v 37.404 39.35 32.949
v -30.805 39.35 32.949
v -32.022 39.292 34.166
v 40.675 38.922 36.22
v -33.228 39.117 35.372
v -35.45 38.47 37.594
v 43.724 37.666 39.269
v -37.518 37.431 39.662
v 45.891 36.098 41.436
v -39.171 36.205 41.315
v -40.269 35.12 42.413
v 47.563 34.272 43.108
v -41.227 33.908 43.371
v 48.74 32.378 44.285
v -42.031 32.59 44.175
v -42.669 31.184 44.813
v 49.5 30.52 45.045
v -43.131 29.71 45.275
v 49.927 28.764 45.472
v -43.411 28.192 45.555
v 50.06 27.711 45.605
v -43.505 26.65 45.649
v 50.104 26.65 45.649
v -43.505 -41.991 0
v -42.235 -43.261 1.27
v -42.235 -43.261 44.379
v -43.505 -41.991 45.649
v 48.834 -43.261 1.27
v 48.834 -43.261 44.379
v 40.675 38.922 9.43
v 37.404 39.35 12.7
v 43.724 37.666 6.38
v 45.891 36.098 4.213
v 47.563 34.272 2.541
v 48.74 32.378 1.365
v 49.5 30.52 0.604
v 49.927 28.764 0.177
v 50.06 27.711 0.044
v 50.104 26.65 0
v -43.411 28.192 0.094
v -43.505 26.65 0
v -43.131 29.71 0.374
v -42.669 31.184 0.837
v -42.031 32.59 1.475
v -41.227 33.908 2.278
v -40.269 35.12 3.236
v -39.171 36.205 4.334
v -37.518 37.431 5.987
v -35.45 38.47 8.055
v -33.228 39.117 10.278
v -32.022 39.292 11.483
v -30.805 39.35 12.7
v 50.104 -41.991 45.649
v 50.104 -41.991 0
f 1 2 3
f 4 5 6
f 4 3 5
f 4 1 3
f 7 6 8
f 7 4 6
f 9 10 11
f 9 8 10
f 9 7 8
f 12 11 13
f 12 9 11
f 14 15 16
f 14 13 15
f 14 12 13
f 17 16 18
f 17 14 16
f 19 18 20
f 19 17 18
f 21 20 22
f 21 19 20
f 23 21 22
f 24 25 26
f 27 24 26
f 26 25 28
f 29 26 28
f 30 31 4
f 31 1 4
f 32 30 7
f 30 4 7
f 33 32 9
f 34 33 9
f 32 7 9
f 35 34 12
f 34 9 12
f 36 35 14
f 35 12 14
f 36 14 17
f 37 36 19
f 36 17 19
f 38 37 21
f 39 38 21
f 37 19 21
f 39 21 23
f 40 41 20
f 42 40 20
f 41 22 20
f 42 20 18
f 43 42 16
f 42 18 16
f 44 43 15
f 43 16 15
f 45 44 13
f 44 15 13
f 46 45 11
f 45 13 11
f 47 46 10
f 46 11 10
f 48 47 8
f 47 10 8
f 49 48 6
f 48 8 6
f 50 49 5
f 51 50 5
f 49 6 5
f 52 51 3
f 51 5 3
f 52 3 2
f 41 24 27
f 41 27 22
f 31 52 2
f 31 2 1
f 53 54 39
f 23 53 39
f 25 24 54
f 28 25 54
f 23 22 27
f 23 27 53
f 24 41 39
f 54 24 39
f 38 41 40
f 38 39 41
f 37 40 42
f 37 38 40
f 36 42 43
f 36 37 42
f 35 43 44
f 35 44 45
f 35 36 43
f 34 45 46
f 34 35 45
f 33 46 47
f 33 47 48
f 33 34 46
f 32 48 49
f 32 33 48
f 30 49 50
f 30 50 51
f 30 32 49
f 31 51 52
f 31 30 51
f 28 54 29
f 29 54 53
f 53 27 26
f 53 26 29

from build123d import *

# Parameters (mm, degrees)
F0_W     = 93.609646
F0_H     = 82.611128
F1_DEPTH = 45.649247
F2_SIZE  = 1.27
F3_R     = 12.7


with BuildPart() as f1:
    # F0 (on Top) → F1 (new body)
    with BuildSketch(Plane.XY):
        with Locations((3.299557, -1.955293)):
            Rectangle(F0_W, F0_H)
    extrude(amount=F1_DEPTH)

    # F2
    f2_edges = [f1.edges().sort_by_distance(p)[0] for p in [
        (-43.505266, -43.260857, 22.824624),
        (50.10438, -43.260857, 22.824624),
        (3.299557, -43.260857, 0),
        (3.299557, -43.260857, 45.649247),
    ]]
    chamfer(f2_edges, length=F2_SIZE)

    # F3
    f3_edges = [f1.edges().sort_by_distance(p)[0] for p in [
        (50.10438, 39.350271, 22.824624),
        (-43.505266, 39.350271, 22.824624),
        (3.299557, 39.350271, 0),
        (3.299557, 39.350271, 45.649247),
    ]]
    fillet(f3_edges, radius=F3_R)


solid = f1.part
